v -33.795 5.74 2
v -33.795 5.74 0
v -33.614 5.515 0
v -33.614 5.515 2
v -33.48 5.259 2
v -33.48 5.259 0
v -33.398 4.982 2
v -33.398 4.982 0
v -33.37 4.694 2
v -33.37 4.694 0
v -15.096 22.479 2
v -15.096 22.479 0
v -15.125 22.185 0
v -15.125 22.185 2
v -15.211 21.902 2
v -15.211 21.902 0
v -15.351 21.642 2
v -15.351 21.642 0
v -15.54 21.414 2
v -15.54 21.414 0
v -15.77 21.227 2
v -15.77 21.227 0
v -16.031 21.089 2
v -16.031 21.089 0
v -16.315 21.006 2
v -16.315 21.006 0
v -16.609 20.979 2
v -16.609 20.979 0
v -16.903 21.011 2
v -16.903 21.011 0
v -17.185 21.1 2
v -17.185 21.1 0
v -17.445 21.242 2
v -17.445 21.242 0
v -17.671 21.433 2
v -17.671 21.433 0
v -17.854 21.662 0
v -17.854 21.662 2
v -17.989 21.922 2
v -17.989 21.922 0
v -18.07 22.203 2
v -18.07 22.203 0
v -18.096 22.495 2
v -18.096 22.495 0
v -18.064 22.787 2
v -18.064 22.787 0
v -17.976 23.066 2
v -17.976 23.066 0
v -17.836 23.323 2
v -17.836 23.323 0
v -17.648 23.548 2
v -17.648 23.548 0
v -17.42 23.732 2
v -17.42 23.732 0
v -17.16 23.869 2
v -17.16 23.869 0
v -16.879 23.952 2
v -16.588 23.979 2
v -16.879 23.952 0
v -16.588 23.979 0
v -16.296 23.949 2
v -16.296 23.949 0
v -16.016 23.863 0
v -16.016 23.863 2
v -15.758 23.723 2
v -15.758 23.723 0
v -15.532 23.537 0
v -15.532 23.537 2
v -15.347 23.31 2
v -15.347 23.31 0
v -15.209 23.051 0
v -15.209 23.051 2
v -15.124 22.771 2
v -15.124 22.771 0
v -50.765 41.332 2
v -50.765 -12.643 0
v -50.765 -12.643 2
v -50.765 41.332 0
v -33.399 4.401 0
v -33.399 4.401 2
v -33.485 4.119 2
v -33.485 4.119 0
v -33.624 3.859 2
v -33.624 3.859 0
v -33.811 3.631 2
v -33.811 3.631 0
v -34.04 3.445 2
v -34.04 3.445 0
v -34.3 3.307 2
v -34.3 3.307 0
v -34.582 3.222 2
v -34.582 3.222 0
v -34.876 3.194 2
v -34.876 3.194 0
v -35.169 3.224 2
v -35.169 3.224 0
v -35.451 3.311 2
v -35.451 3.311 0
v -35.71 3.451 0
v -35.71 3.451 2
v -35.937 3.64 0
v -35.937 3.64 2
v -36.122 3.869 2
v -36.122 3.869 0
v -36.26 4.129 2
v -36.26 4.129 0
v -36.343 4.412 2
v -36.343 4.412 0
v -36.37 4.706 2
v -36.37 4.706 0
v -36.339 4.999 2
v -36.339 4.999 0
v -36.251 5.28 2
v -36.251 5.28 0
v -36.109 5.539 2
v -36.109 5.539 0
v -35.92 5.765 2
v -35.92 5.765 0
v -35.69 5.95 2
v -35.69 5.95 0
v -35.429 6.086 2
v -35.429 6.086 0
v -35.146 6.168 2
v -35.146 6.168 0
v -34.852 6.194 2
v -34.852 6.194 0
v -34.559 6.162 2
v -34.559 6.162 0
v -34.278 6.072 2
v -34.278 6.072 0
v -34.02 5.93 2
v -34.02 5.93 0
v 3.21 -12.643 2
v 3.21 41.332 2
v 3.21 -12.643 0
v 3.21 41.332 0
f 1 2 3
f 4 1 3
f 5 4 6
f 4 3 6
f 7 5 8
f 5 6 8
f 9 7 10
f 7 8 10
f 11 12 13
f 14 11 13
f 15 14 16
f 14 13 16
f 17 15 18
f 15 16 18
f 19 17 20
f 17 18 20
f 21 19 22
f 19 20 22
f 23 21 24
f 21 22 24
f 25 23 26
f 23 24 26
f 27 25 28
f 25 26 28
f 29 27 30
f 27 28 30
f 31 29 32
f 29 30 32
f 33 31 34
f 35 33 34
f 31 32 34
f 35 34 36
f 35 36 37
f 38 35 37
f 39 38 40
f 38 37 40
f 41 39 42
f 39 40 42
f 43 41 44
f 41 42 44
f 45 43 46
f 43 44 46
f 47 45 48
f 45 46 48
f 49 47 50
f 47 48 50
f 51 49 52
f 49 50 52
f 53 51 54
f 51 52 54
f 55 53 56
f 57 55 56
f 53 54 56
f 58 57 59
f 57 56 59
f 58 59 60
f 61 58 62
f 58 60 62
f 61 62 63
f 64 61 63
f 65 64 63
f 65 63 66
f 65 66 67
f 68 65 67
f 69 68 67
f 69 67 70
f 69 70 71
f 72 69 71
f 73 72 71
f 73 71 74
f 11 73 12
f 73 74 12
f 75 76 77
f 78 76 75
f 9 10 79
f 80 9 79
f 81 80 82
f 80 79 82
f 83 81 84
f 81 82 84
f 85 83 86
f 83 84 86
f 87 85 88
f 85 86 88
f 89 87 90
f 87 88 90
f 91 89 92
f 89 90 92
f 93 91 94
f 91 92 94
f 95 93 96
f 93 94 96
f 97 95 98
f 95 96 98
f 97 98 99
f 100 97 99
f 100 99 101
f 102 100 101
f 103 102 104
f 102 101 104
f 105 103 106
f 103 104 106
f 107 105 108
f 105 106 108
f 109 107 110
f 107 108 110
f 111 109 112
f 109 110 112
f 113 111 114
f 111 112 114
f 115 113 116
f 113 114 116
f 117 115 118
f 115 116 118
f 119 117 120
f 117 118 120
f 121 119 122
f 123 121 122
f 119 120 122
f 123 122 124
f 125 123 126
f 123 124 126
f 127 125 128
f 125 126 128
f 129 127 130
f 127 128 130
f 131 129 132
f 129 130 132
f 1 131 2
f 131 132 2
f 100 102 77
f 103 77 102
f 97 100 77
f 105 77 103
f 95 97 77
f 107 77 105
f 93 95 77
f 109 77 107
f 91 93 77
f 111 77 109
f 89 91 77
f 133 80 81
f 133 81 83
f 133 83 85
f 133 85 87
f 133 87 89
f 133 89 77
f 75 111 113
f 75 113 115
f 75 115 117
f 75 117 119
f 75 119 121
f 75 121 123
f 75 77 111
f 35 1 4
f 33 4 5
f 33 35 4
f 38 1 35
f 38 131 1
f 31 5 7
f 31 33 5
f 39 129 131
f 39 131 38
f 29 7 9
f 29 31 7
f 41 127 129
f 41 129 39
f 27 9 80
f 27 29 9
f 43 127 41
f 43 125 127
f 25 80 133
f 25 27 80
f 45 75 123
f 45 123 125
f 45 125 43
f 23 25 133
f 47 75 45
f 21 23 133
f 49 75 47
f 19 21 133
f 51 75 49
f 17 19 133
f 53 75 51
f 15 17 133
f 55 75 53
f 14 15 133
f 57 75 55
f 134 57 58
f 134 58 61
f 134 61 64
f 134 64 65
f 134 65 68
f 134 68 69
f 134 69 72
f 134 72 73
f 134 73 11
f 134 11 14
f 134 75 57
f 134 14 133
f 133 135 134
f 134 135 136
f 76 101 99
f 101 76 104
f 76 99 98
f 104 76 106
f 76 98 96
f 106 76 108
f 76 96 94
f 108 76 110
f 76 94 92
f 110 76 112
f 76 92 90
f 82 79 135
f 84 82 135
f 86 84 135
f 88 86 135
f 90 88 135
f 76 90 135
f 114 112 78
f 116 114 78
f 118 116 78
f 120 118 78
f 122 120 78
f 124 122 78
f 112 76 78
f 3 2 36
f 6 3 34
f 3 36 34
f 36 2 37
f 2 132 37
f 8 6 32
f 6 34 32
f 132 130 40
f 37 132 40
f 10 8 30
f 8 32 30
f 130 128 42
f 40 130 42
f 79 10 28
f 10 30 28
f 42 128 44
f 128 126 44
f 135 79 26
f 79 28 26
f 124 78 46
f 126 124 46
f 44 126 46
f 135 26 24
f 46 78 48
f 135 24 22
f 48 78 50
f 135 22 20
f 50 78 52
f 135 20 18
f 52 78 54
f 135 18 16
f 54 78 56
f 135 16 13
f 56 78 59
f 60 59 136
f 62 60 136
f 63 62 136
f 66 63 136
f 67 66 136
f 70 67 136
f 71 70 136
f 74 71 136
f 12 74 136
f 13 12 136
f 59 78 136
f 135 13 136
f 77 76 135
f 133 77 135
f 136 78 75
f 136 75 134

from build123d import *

# Parameters (mm, degrees)
F0_W     = 53.975
F0_H     = 53.975
F1_DEPTH = 2


with BuildPart() as f1:
    # F0 (on Top) → F1 (new body)
    with BuildSketch(Plane.XY):
        with Locations((-23.777467, 14.34453)):
            Rectangle(F0_W, F0_H)
        with BuildLine():
            ThreePointArc((-33.794921, 5.740177), (-33.480186, 5.258613), (-33.369865, 4.693996))
            ThreePointArc((-33.369865, 4.693996), (-36.259544, 4.129379), (-33.794921, 5.740177))
        make_face(mode=Mode.SUBTRACT)
        with BuildLine():
            ThreePointArc((-15.095824, 22.479086), (-16.031207, 21.089407), (-17.670768, 21.432904))
            ThreePointArc((-17.670768, 21.432904), (-17.160441, 23.868765), (-15.095824, 22.479086))
        make_face(mode=Mode.SUBTRACT)
    extrude(amount=F1_DEPTH)


solid = f1.part
